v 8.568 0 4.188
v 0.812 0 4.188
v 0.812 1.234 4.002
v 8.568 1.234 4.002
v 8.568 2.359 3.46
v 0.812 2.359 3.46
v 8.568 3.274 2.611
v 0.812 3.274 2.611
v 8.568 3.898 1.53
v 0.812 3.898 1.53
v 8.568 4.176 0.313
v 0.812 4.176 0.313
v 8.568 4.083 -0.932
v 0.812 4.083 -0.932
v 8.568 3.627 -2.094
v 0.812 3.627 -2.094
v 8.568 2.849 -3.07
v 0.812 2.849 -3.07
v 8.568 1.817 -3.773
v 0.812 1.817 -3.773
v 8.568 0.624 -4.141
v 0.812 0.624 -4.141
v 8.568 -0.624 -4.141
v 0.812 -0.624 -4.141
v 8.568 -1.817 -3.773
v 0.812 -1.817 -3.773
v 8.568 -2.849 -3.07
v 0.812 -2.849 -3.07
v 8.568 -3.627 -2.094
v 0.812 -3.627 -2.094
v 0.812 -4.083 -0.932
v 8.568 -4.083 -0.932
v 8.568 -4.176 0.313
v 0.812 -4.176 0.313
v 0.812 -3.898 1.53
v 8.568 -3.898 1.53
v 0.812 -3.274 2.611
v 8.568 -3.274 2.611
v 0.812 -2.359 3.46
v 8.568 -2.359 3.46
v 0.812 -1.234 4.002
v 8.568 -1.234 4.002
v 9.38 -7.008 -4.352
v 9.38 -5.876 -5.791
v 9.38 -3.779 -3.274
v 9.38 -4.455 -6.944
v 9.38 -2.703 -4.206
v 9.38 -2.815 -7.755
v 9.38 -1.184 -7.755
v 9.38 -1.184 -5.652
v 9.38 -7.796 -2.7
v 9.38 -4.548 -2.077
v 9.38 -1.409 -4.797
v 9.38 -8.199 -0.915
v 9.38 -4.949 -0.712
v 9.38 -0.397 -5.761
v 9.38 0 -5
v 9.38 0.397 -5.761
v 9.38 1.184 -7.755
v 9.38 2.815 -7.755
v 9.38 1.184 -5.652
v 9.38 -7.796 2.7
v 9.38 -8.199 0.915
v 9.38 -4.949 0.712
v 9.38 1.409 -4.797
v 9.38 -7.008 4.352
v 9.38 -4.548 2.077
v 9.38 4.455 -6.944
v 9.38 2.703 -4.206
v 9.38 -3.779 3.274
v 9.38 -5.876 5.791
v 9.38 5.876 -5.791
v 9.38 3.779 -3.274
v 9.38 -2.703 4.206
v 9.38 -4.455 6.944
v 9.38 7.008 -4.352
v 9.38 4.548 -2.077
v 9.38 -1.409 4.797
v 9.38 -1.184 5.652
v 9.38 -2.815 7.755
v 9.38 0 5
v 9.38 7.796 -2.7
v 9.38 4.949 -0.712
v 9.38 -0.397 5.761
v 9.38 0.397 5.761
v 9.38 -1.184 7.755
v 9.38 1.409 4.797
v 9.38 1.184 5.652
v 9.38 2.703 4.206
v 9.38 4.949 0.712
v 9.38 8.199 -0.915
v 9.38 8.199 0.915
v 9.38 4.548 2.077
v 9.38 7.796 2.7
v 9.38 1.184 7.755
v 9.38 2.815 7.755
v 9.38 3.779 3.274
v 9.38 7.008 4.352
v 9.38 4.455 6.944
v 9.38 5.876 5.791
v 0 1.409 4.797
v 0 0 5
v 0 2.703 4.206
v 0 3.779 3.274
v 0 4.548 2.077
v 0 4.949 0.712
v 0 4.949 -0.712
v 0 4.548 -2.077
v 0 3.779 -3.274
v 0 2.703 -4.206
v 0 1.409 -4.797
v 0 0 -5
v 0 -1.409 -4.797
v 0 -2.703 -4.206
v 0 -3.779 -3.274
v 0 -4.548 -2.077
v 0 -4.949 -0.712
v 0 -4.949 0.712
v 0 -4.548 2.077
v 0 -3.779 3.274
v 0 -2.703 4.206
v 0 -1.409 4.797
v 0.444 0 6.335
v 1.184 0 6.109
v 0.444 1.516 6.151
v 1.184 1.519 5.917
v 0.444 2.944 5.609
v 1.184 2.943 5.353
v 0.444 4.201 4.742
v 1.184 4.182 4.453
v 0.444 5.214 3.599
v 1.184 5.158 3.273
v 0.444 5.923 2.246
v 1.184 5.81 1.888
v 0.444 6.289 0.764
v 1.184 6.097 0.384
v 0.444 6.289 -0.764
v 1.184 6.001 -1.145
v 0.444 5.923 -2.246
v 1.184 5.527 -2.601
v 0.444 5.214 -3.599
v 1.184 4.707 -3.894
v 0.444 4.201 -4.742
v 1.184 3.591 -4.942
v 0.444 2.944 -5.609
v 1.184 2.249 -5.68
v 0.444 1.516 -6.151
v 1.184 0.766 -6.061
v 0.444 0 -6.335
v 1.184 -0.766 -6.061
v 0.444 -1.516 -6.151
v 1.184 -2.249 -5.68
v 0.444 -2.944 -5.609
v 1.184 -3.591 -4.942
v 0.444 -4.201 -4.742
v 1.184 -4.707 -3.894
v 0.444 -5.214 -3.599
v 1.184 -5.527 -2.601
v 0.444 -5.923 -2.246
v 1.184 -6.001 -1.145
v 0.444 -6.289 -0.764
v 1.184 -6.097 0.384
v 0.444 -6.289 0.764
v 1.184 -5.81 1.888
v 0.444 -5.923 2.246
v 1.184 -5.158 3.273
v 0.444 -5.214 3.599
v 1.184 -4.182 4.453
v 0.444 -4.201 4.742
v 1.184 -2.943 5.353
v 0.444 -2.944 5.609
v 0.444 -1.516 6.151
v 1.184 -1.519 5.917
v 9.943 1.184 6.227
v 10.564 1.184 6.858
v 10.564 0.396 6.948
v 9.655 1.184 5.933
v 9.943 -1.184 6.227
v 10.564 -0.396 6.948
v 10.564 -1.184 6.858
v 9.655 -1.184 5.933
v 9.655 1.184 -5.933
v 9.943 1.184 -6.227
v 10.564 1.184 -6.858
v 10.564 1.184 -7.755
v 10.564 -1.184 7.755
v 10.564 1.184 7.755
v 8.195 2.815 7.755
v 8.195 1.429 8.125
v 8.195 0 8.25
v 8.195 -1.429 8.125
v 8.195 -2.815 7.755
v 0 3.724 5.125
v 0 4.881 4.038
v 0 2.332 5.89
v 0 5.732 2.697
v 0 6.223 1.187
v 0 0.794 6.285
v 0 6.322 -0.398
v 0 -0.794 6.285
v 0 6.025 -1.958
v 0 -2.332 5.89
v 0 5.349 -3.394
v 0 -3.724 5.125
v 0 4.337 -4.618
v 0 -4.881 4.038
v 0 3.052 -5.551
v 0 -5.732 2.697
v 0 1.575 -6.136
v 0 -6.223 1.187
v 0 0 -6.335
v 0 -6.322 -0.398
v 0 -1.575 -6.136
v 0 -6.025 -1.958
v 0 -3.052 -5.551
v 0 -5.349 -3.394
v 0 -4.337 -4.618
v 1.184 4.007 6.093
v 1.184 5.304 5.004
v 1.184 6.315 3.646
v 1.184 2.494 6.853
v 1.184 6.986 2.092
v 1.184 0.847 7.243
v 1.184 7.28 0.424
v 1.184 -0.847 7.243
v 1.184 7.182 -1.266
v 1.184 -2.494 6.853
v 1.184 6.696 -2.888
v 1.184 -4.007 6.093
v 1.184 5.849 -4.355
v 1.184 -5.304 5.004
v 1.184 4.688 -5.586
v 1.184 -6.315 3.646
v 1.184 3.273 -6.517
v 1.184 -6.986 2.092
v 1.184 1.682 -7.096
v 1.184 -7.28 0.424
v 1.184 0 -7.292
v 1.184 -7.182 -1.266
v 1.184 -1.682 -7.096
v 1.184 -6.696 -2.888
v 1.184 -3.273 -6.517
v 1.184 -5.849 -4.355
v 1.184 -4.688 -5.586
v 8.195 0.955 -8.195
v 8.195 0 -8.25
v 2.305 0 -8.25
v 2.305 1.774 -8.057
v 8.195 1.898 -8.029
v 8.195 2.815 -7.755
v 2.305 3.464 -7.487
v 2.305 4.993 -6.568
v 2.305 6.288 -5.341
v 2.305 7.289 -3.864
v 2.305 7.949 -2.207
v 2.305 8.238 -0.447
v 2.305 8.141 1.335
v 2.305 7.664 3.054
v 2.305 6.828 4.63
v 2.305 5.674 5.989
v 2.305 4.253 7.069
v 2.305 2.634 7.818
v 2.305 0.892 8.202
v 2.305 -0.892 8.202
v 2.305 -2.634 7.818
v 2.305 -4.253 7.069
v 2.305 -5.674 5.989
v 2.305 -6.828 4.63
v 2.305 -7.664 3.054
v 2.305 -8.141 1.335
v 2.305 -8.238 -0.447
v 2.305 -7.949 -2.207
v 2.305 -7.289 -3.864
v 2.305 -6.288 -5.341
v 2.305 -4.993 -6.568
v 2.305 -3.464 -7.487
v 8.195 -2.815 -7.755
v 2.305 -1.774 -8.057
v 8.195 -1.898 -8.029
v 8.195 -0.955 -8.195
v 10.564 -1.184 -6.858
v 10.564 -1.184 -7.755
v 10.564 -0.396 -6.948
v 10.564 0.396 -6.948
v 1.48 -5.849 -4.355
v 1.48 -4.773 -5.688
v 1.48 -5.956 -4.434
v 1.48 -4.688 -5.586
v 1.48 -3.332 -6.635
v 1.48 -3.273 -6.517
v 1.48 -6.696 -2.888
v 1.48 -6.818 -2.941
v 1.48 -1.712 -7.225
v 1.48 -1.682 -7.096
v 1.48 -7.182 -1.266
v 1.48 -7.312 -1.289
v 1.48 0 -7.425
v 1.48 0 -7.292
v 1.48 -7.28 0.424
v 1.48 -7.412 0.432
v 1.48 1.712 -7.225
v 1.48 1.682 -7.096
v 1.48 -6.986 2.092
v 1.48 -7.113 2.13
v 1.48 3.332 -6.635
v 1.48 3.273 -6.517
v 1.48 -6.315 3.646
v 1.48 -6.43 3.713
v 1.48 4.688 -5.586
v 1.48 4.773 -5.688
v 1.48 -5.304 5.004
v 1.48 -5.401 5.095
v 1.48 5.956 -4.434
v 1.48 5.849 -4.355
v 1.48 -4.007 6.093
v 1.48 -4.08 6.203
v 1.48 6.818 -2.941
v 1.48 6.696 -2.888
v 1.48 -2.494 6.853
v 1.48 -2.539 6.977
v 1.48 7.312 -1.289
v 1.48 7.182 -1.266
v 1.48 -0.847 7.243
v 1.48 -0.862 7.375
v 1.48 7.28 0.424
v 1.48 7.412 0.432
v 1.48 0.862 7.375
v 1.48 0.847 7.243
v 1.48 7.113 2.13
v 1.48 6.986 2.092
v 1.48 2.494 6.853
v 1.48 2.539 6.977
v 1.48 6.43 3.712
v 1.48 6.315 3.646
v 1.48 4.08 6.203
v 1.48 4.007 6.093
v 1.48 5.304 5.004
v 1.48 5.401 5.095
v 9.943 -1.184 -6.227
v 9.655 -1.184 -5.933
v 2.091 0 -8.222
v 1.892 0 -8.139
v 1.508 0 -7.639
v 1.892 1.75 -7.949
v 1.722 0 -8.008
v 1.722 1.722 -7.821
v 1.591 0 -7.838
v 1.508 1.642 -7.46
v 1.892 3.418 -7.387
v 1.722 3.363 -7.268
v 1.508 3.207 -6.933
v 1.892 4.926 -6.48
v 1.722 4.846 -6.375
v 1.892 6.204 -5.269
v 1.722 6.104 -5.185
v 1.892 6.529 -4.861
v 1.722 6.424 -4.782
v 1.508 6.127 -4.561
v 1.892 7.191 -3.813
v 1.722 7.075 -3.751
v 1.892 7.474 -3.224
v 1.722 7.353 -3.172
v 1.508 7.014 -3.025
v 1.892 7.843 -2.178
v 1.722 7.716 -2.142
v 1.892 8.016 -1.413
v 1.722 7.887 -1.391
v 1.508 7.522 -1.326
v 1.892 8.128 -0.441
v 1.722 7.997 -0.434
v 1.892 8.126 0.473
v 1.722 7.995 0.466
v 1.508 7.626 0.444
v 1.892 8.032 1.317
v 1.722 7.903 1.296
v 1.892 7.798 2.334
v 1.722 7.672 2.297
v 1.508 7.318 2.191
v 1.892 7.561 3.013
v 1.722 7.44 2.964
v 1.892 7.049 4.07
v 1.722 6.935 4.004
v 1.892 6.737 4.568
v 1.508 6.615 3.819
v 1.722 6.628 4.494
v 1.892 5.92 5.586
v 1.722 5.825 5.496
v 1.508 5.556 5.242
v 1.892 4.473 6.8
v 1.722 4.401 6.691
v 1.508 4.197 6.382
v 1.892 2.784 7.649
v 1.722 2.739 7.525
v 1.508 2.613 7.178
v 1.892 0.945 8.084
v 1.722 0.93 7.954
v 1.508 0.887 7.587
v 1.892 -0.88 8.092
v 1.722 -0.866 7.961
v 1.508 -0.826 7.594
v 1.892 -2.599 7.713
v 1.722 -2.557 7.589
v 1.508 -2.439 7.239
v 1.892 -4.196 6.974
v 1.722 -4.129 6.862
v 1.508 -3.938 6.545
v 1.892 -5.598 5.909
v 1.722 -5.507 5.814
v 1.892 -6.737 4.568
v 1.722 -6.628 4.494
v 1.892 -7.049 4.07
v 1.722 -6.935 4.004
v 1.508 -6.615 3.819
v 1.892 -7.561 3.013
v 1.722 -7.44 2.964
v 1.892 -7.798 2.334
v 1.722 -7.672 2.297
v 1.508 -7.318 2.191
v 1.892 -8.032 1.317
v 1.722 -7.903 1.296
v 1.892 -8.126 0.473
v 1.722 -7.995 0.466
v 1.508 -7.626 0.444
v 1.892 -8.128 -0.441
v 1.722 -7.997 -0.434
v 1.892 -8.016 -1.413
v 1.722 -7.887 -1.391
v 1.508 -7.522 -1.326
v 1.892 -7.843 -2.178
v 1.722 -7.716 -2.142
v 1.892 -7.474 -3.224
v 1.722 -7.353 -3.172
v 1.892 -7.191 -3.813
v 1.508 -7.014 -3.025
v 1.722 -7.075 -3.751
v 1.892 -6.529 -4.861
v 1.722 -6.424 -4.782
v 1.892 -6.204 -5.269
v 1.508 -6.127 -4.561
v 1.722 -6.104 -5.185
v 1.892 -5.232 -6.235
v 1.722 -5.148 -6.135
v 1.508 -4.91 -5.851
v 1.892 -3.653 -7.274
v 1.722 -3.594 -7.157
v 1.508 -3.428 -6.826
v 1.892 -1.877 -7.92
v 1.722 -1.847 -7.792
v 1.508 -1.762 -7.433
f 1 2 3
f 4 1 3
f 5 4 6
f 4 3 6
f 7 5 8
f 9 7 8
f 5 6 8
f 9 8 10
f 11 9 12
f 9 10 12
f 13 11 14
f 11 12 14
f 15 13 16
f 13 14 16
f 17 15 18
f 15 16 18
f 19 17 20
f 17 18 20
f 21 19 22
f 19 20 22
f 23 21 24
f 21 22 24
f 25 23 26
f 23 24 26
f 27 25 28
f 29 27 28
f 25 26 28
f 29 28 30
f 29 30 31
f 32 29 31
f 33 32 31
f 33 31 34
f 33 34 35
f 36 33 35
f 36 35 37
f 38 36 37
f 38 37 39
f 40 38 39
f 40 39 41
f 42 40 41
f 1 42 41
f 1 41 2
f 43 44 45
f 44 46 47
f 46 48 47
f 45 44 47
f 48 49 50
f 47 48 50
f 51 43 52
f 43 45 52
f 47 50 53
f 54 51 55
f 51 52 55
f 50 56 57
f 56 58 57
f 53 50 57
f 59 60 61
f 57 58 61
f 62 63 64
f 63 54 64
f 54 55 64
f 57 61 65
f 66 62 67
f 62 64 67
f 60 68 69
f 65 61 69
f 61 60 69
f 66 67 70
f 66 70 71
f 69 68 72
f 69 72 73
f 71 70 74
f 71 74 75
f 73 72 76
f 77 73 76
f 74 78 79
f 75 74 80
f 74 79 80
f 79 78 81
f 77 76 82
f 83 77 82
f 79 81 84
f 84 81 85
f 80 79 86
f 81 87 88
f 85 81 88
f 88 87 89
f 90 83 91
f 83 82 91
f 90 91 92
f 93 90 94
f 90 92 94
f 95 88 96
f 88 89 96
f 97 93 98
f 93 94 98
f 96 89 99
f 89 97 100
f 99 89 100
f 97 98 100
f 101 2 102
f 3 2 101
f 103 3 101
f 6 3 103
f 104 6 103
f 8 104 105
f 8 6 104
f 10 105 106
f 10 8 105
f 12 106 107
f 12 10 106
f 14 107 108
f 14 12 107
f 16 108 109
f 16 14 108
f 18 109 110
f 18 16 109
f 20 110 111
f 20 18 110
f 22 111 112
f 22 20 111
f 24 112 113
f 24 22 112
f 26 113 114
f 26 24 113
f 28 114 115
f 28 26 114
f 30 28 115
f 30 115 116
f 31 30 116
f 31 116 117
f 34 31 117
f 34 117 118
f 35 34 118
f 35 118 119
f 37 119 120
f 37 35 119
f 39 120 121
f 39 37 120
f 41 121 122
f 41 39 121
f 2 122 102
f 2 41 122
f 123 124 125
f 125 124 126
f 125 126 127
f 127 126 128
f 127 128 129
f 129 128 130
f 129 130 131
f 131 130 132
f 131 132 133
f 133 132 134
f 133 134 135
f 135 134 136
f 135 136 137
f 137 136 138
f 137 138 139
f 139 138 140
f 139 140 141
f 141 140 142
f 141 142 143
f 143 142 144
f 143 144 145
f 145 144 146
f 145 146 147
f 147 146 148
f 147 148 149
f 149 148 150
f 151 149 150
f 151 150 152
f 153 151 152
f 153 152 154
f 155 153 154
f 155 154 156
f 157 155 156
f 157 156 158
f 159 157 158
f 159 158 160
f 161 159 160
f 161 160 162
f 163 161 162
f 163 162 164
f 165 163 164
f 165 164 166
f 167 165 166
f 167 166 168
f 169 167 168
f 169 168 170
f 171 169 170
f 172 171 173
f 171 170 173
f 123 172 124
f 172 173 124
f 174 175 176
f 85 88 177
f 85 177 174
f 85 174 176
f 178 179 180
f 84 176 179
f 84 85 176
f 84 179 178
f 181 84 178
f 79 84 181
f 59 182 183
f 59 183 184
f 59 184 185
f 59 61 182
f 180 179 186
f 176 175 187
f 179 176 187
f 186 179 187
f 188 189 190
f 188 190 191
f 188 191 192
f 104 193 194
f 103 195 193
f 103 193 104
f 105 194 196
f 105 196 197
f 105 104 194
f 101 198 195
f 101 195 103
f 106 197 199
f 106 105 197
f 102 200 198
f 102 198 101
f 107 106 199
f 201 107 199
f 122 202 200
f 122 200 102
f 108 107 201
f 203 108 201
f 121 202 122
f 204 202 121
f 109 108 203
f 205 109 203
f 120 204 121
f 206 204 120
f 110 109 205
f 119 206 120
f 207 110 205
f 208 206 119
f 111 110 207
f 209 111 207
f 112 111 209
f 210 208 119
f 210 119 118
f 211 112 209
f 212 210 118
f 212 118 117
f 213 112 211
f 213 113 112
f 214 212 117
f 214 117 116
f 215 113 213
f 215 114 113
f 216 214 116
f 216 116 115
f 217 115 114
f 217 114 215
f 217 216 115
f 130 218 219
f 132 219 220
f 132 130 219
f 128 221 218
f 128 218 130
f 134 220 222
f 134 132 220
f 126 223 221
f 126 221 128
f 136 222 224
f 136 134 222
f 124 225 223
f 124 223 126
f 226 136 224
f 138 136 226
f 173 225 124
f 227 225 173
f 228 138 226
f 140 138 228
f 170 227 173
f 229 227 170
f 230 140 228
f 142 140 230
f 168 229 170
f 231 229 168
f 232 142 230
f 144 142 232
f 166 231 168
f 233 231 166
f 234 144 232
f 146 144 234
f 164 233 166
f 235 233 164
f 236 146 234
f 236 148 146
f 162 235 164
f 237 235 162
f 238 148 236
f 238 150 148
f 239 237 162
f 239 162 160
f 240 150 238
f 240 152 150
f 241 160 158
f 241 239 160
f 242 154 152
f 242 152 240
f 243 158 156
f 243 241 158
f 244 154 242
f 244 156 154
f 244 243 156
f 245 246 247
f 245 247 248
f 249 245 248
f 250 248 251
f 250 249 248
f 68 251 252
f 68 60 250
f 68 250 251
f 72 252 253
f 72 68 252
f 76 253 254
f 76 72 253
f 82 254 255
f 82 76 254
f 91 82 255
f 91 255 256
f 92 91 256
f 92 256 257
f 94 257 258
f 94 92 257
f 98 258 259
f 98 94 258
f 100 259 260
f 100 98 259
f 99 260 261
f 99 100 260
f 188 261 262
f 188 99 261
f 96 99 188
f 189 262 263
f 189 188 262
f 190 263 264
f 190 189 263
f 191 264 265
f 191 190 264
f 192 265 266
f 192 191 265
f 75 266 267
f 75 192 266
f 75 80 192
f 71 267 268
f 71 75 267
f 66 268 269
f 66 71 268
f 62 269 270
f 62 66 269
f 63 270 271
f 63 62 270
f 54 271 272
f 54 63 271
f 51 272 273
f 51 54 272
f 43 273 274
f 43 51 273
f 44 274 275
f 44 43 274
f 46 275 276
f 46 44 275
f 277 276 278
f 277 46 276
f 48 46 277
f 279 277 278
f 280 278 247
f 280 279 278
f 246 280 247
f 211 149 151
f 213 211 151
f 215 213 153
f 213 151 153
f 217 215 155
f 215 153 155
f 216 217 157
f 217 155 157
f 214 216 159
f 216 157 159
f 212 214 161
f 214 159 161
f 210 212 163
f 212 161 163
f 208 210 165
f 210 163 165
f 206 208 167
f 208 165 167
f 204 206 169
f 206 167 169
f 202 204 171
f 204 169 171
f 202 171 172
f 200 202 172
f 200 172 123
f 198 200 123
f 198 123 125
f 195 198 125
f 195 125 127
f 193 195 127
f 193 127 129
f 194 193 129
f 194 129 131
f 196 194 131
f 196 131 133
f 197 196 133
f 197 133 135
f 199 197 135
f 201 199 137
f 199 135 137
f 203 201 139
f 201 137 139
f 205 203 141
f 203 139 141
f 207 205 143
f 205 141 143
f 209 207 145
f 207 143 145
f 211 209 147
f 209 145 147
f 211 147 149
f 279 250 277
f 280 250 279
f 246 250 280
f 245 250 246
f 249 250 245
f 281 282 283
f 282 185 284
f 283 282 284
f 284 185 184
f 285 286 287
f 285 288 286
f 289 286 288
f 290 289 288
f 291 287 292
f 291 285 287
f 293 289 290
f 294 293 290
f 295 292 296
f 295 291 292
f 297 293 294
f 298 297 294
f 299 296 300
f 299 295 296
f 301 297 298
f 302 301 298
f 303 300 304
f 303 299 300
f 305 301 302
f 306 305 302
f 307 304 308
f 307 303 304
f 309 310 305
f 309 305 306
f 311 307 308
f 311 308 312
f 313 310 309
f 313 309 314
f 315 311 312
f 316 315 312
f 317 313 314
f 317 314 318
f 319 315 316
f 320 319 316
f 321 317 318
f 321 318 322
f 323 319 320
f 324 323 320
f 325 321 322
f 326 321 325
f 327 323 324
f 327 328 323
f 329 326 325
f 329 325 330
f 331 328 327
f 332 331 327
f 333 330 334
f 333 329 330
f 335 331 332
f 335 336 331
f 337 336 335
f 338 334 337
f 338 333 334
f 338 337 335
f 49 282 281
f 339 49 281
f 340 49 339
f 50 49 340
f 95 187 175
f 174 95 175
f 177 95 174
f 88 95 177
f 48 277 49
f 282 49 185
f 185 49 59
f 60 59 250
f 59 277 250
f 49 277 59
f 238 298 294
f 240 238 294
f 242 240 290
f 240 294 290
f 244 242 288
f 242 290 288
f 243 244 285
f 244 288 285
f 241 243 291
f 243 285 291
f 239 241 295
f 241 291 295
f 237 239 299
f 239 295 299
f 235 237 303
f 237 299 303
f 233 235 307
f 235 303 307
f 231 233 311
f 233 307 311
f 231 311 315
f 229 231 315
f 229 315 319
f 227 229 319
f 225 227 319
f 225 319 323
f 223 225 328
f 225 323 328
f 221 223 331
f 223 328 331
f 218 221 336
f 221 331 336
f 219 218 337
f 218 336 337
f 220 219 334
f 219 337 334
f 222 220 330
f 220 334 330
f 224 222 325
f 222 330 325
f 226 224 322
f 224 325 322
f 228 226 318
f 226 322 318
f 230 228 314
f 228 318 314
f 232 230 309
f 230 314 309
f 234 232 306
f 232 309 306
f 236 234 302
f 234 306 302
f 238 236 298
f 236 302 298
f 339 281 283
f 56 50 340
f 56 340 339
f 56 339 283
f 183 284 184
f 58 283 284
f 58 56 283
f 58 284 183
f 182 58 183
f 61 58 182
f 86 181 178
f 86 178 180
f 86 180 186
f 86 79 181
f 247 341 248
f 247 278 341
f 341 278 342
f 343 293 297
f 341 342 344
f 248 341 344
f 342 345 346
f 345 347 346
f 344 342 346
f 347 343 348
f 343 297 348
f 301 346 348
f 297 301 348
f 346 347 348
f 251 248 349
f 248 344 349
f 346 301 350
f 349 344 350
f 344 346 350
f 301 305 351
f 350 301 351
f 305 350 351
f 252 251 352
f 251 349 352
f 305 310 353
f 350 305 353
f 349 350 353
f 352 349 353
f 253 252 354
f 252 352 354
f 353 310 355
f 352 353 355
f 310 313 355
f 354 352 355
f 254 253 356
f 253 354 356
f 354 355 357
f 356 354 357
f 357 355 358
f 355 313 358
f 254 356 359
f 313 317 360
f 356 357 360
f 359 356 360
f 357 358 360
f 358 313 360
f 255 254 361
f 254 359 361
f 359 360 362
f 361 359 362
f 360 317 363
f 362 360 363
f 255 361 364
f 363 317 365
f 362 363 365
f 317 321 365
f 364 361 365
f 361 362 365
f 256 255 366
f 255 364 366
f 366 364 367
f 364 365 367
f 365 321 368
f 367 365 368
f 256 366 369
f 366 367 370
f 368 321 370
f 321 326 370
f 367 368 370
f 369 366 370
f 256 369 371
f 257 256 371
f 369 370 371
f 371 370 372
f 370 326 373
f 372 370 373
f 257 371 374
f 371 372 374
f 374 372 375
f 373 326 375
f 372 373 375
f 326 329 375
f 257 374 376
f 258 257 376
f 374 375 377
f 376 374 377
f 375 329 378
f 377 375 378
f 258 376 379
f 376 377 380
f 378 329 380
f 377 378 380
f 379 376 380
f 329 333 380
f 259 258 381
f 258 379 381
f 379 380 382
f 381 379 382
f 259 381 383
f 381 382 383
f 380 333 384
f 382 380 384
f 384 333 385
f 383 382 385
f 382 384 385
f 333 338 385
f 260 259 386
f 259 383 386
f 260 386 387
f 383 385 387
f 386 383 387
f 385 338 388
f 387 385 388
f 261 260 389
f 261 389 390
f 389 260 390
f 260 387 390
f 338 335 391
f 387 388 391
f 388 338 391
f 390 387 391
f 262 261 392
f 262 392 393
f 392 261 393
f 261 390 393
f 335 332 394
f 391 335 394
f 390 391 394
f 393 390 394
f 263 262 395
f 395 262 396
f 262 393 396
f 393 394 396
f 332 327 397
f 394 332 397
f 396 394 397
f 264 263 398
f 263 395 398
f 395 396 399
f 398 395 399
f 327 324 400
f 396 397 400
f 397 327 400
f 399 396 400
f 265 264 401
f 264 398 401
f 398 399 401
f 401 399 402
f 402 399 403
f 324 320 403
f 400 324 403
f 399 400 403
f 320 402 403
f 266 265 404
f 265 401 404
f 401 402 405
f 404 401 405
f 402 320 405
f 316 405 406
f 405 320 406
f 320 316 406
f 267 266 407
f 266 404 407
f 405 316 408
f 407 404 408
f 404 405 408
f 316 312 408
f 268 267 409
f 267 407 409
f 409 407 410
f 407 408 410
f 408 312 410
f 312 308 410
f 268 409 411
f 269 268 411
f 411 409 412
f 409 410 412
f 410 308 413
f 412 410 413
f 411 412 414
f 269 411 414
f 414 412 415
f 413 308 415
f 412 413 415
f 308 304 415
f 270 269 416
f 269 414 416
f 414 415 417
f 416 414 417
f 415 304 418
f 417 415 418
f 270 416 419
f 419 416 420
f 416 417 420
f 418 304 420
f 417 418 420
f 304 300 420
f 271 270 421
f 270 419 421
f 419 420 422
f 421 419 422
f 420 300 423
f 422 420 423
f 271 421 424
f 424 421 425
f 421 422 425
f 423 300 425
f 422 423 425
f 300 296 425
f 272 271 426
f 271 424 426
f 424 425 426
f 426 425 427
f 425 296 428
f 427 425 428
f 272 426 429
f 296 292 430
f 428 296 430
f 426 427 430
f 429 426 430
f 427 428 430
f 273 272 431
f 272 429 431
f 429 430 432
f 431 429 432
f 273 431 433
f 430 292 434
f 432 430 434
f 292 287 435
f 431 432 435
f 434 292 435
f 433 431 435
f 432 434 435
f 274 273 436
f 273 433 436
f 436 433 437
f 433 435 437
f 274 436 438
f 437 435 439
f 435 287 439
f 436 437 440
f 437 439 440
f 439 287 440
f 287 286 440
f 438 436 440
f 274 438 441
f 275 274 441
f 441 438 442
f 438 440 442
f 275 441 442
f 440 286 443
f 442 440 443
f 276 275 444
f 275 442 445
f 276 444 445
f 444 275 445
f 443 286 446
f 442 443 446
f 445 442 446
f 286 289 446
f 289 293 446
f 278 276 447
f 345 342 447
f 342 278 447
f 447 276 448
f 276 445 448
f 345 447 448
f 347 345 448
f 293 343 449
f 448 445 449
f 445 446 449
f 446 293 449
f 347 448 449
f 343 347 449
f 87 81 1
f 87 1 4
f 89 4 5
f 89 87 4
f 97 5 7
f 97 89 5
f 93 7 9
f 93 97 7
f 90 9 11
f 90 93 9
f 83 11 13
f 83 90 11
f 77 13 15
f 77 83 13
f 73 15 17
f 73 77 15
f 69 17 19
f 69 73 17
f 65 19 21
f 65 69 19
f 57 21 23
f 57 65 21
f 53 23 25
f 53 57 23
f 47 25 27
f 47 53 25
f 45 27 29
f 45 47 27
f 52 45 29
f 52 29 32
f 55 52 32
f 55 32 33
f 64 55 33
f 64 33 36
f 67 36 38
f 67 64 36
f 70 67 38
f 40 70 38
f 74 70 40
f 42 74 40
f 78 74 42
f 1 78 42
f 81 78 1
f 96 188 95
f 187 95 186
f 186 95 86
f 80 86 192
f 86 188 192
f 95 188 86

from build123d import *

# Parameters (mm, degrees)
ESQUISSE1_W             = 7.9
ESQUISSE1_H             = 8.25
BOSS_EXTRU_1_DEPTH      = 1.184
ENL_V_MAT_EXTRU_1_REACH = 15.462
BOSS_EXTRU_2_DEPTH      = 1.184
ENL_V_MAT_EXTRU_2_REACH = 15.462
ESQUISSE8_R             = 7.2925
BOSS_EXTRU_3_DEPTH      = 0.296
ESQUISSE9_R             = 6.10875
BOSS_EXTRU_4_DEPTH      = 0.74
BOSS_EXTRU_4_DRAFT      = -17.000658211
ESQUISSE10_R            = 6.335
BOSS_EXTRU_5_DEPTH      = 0.444
D_POUILLE1_ANGLE        = 44.999999999
PER_AGE1_D              = 8.376
CHANFREIN1_SIZE         = 0.812
CONG_1_R                = 0.825


with BuildPart() as part:
    # Esquisse1 → Révolution1 (revolve)
    with BuildSketch(Plane.XY, mode=Mode.PRIVATE) as r_volution1_sk:
        with Locations((5.43, 4.125)):
            Rectangle(ESQUISSE1_W, ESQUISSE1_H)
    revolve(r_volution1_sk.sketch.rotate(Axis((1.48, 0, 0), (1, 0, 0)), 270), axis=Axis((1.48, 0, 0), (1, 0, 0)))

    # Esquisse2 → Boss.-Extru.1 (add)
    with BuildSketch(Plane(origin=(9.38, 0, 0), x_dir=(0, 0, -1), z_dir=(1, 0, 0))):
        with BuildLine():
            Line((-5.652324212, -1.184), (-7.755, -1.184))
            Line((-7.755, -1.184), (-7.755, 1.184))
            Line((-7.755, 1.184), (-5.652324212, 1.184))
            ThreePointArc((-5.652324212, 1.184), (-5.775, 0), (-5.652324212, -1.184))
        make_face()
    extrude(amount=BOSS_EXTRU_1_DEPTH)

    # Esquisse4 → Enlèv. mat.-Extru.1 (cut, up to next)
    with BuildSketch(Plane(origin=(8.195, 0, 0), x_dir=(0, -1, 0), z_dir=(-1, 0, 0)), mode=Mode.PRIVATE) as enl_v_mat_extru_1_sk1:
        with BuildLine():
            Line((-2.814689148, 7.755), (2.814689148, 7.755))
            ThreePointArc((2.814689148, 7.755), (0, 8.25), (-2.814689148, 7.755))
        make_face()
    enl_v_mat_extru_1_tool1 = extrude(enl_v_mat_extru_1_sk1.sketch, amount=-ENL_V_MAT_EXTRU_1_REACH, mode=Mode.PRIVATE) & part.part
    add(enl_v_mat_extru_1_tool1.solids().sort_by_distance((8.195, 0, 7.953518))[0], mode=Mode.SUBTRACT)

    # Esquisse5 → Boss.-Extru.2 (add)
    with BuildSketch(Plane(origin=(9.38, 0, 0), x_dir=(0, 0, -1), z_dir=(1, 0, 0))):
        with BuildLine():
            Line((7.755, 1.184), (7.755, -1.184))
            Line((7.755, -1.184), (5.652324212, -1.184))
            ThreePointArc((5.652324212, -1.184), (5.775, 0), (5.652324212, 1.184))
            Line((5.652324212, 1.184), (7.755, 1.184))
        make_face()
    extrude(amount=BOSS_EXTRU_2_DEPTH)

    # Esquisse7 → Enlèv. mat.-Extru.2 (cut, up to next)
    with BuildSketch(Plane(origin=(8.195, 0, 0), x_dir=(0, -1, 0), z_dir=(-1, 0, 0)), mode=Mode.PRIVATE) as enl_v_mat_extru_2_sk1:
        with BuildLine():
            Line((2.814689148, -7.755), (-2.814689148, -7.755))
            ThreePointArc((-2.814689148, -7.755), (0, -8.25), (2.814689148, -7.755))
        make_face()
    enl_v_mat_extru_2_tool1 = extrude(enl_v_mat_extru_2_sk1.sketch, amount=-ENL_V_MAT_EXTRU_2_REACH, mode=Mode.PRIVATE) & part.part
    add(enl_v_mat_extru_2_tool1.solids().sort_by_distance((8.195, 0, -7.953518))[0], mode=Mode.SUBTRACT)

    # Esquisse8 → Boss.-Extru.3 (add)
    with BuildSketch(Plane.ZY.offset(-1.48)):
        with Locations(Location((0, 0, 0), (0, 0, 180))):
            Circle(ESQUISSE8_R)
    extrude(amount=BOSS_EXTRU_3_DEPTH)


with BuildPart() as boss_extru_4_tool:
    # Esquisse9 → Boss.-Extru.4 (with draft: the straight prism first)
    with BuildSketch(Plane.ZY.offset(-1.184)):
        Circle(ESQUISSE9_R)
    extrude(amount=BOSS_EXTRU_4_DEPTH)
    # Boss.-Extru.4: the draft: its side faces are tilted about the plane it starts from
    boss_extru_4_sides = [boss_extru_4_tool.faces().sort_by_distance(p)[0] for p in [
        (0.814, 0, -6.10875),
    ]]
    draft(boss_extru_4_sides, Plane.ZY.offset(-1.184), BOSS_EXTRU_4_DRAFT)


with BuildPart() as part_1:
    add(part.part)

    # Boss.-Extru.4: add boss_extru_4_tool
    add(boss_extru_4_tool.part)

    # Esquisse10 → Boss.-Extru.5 (add)
    with BuildSketch(Plane.ZY.offset(-0.444)):
        with Locations(Location((0, 0, 0), (0, 0, 180))):
            Circle(ESQUISSE10_R)
    extrude(amount=BOSS_EXTRU_5_DEPTH)

    # Dépouille1
    d_pouille1_faces = [part_1.faces().sort_by_distance(p)[0] for p in [
        (9.972, 0, 5.775),
        (9.972, 0, -5.775),
    ]]
    draft(d_pouille1_faces, Plane(origin=(9.38, 0, 0), x_dir=(0, 0, 1), z_dir=(1, 0, 0)), D_POUILLE1_ANGLE)

    # Perçage1 (through all)
    with Locations(Plane(origin=(9.38, 0, 0), x_dir=(0, 0, -1), z_dir=(1, 0, 0))):
        with Locations((0, 0)):
            Hole(PER_AGE1_D / 2)

    # Chanfrein1
    chanfrein1_edges = [part_1.edges().sort_by_distance(p)[0] for p in [
        (9.38, 0, -4.188),
        (0, 0, -4.188),
    ]]
    chamfer(chanfrein1_edges, length=CHANFREIN1_SIZE)

    # Congé1
    cong_1_edges = [part_1.edges().sort_by_distance(p)[0] for p in [
        (1.48, 0, 8.25),
    ]]
    fillet(cong_1_edges, radius=CONG_1_R)


solid = part_1.part
